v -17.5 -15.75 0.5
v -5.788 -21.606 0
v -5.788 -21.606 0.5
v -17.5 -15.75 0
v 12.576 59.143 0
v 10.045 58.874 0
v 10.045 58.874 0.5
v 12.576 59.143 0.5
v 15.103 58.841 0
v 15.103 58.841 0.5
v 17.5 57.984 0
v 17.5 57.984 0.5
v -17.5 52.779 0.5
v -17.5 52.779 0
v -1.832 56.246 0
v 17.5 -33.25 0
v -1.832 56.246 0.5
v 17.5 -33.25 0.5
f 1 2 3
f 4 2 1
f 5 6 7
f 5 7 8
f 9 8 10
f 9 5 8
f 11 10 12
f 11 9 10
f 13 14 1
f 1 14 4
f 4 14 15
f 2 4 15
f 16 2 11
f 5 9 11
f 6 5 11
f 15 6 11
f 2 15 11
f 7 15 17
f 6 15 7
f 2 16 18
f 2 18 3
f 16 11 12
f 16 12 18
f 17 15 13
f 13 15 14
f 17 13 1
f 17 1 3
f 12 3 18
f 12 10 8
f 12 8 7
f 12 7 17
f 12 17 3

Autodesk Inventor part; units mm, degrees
ref_plane "YZ Plane" through (0, 0, 0) normal (1, 0, 0) x (0, 1, 0)
ref_plane "XZ Plane" through (0, 0, 0) normal (0, 1, 0) x (-1, 0, 0)
ref_plane "XY Plane" through (0, 0, 0) normal (0, 0, 1) x (1, 0, 0)
sketch "Sketch1" plane through (0, 0, 0) normal (0, 0, 1) x (1, 0, 0)
  line L0 (7.5, 3.8038) -> (3.6225, 3.8038) projected
  arc A0 (1.9153, 4.762) -> (3.6225, 3.8038) centre (3.6225, 5.8038) ccw projected
  line L1 (1.9153, 4.762) -> (-2.2072, 11.517) projected
  arc A1 (-2.5, 12.5588) -> (-2.2072, 11.517) centre (-0.5, 12.5588) ccw projected
  line L2 (-2.5, 12.5588) -> (-2.5, 21.8038) projected
  arc A2 (-0.5, 23.8038) -> (-2.5, 21.8038) centre (-0.5, 21.8038) ccw projected
  line L3 (-0.5, 23.8038) -> (7.5, 23.8038) projected
  line L4 (7.5, 23.8038) -> (7.5, 3.8038) projected
  spline S0 degree 3 poles (-6.0485, -11.2843) (-6.0213, -11.0209) (-5.9428, -10.7653) (-5.6929, -10.2997) (-5.524, -10.094) (-5.1467, -9.7842) (-4.9505, -9.6718) (-4.5292, -9.5173) (-4.3073, -9.4763) (-4.0832, -9.4731) knots 0 0 0 0 0.079442 0.079442 0.158531 0.158531 0.225919 0.225919 0.293184 0.293184 0.293184 0.293184 projected
  line L5 (-6.0485, -11.2843) -> (-6.563, -16.2598) projected
  line L6 (-6.563, -16.2598) -> (-6.8849, -19.6266) projected
  arc A3 (-6.8849, -19.6266) -> (-5.7884, -21.6058) centre (-4.894, -19.817) ccw projected
  line L7 (17.5, -33.2499) -> (-5.7884, -21.6058) projected
  line L8 (17.5, 31.9794) -> (17.5, -33.2499) projected
  arc A4 (4.376, 33.2499) -> (17.5, 31.9794) centre (12.5, 48.7499) ccw projected
  arc A5 (-1.8324, 56.2463) -> (4.376, 33.2499) centre (12.5, 47.7794) ccw projected
  line L9 (-1.8324, 56.2463) -> (-17.5, 52.7794) projected
  line L10 (-17.5, 52.7794) -> (-17.5, 3.0185) projected
  ellipse E0 centre (-15.5, 3.0185) end of major axis (-15.5, 1.0011) minor radius 2 (-17.5, 3.0185) -> (-15.6888, 1.0101) ccw projected
  line L11 (-15.6888, 1.0101) -> (-3.1949, -0.1848) projected
  line L12 (-3.1949, -0.1848) -> (-4.0832, -9.4731) projected
  circle A6 centre (-12, 26.728) radius 1.25 projected
  circle A7 centre (5.3255, 26.728) radius 1.25 projected
  line L13 (-14, 9.2999) -> (-10, 9.2999) projected
  line L14 (-14, 15.6999) -> (-14, 9.2999) projected
  line L15 (-10, 15.6999) -> (-14, 15.6999) projected
  line L16 (-10, 9.2999) -> (-10, 15.6999) projected
  line L17 (13.7851, 6.0601) -> (9.7851, 6.0601) projected
  line L18 (13.7851, -0.3399) -> (13.7851, 6.0601) projected
  line L19 (9.7851, -0.3399) -> (13.7851, -0.3399) projected
  line L20 (9.7851, 6.0601) -> (9.7851, -0.3399) projected
  circle A8 centre (7.1425, -8.6154) radius 1.25 projected
  line L21 (17.5, -33.2499) -> (-17.5, -15.7501) projected
  line L22 (-17.5, -15.7501) -> (-17.5, -17.9862) projected
  line L23 (-17.5, -17.9862) -> (17.5, -35.486) projected
  line L24 (17.5, -35.486) -> (17.5, -33.2499) projected
  line L25 (-1.4649, 56.8397) -> (-18, 53.1809) projected
  line L26 (-18, 53.1809) -> (-18, -17.9862) projected
  line L27 (-18, -17.9862) -> (-17.5, -17.9862) projected
  line L28 (-17.5, -17.9862) -> (-17.5, 52.7794) projected
  line L29 (-17.5, 52.7794) -> (-1.8324, 56.2463) projected
  arc A9 (-1.4649, 56.8397) -> (-1.8324, 56.2463) centre (12.5, 47.7794) ccw projected
  line L30 (19.5, -37.0206) -> (19.5, 31.9794) projected
  line L31 (19.5, 31.9794) -> (17.5, 31.9794) projected
  line L32 (17.5, -37.0206) -> (17.5, 31.9794) projected
  line L33 (19.5, -37.0206) -> (17.5, -37.0206) projected
  circle A10 centre (12.5, 47.7794) radius 15.02 projected
  line L34 (-1.4649, 56.8397) -> (-11.9805, 54.5129)
  line L35 (-11.9805, 54.5129) -> (26.5324, 63.5095)
  line L36 (17.5, 31.9794) -> (17.5, 20.7849)
  line L37 (17.5, 20.7849) -> (17.5, 78.444)
  circle A11 centre (12.5, 47.7794) radius 12.1257
  line L38 (-17.5, -15.7501) -> (-17.5, 52.7794)
  line L39 (-1.8324, 56.2463) -> (11.2654, 59.1445)
  line L40 (11.2654, 59.1445) -> (26.5324, 62.5227)
  circle A12 centre (12.5, 47.7794) radius 11.3634
  point P0 (0, 0)
  point P1 (17.5, 57.9837)
  point P2 (10.0449, 58.8745)
extrude "Extrusion1" add sketch "Sketch1" along normal blind 0.5 contours L0 A0 L1 A1 L2 A2 L3 L4 | L5 L6 A3 L21 L28 E0 L11 L12 S0 | S0 L12 L11 E0 L10 L9 A5 A4 L8 L7 A3 L6 L5 | L39 A10 L37 A4 A5 | L39 A11 L37 A10 | L39 A12 L37 A11 | A12 L37 | L14 L15 L16 L13 | L18 L19 L20 L17 picked at (9.8401, 51.5561)
sketch "Sketch2" plane through (0, 0, 0.5) normal (0, 0, 1) x (1, 0, 0)
  line L0 (17.5, -33.2499) -> (17.5, 57.9837) projected
  arc A0 (17.5, 57.9837) -> (10.0449, 58.8745) centre (12.5, 47.7794) ccw projected
  line L1 (10.0449, 58.8745) -> (-17.5, 52.7794) projected
  line L2 (-17.5, 52.7794) -> (-17.5, -15.7501) projected
  line L3 (-17.5, -15.7501) -> (17.5, -33.2499) projected
  circle A1 centre (-12, 26.728) radius 1.25 projected
  circle A2 centre (5.3255, 26.728) radius 1.25 projected
  circle A3 centre (7.1425, -8.6154) radius 1.25 projected
  point P0 (0, 0)
extrude "Extrusion2" add sketch "Sketch2" against normal blind 0.5 contours A1 | A2 | A3
properties part number "pokrywa lewa" material "Stal miękka, spawana"
